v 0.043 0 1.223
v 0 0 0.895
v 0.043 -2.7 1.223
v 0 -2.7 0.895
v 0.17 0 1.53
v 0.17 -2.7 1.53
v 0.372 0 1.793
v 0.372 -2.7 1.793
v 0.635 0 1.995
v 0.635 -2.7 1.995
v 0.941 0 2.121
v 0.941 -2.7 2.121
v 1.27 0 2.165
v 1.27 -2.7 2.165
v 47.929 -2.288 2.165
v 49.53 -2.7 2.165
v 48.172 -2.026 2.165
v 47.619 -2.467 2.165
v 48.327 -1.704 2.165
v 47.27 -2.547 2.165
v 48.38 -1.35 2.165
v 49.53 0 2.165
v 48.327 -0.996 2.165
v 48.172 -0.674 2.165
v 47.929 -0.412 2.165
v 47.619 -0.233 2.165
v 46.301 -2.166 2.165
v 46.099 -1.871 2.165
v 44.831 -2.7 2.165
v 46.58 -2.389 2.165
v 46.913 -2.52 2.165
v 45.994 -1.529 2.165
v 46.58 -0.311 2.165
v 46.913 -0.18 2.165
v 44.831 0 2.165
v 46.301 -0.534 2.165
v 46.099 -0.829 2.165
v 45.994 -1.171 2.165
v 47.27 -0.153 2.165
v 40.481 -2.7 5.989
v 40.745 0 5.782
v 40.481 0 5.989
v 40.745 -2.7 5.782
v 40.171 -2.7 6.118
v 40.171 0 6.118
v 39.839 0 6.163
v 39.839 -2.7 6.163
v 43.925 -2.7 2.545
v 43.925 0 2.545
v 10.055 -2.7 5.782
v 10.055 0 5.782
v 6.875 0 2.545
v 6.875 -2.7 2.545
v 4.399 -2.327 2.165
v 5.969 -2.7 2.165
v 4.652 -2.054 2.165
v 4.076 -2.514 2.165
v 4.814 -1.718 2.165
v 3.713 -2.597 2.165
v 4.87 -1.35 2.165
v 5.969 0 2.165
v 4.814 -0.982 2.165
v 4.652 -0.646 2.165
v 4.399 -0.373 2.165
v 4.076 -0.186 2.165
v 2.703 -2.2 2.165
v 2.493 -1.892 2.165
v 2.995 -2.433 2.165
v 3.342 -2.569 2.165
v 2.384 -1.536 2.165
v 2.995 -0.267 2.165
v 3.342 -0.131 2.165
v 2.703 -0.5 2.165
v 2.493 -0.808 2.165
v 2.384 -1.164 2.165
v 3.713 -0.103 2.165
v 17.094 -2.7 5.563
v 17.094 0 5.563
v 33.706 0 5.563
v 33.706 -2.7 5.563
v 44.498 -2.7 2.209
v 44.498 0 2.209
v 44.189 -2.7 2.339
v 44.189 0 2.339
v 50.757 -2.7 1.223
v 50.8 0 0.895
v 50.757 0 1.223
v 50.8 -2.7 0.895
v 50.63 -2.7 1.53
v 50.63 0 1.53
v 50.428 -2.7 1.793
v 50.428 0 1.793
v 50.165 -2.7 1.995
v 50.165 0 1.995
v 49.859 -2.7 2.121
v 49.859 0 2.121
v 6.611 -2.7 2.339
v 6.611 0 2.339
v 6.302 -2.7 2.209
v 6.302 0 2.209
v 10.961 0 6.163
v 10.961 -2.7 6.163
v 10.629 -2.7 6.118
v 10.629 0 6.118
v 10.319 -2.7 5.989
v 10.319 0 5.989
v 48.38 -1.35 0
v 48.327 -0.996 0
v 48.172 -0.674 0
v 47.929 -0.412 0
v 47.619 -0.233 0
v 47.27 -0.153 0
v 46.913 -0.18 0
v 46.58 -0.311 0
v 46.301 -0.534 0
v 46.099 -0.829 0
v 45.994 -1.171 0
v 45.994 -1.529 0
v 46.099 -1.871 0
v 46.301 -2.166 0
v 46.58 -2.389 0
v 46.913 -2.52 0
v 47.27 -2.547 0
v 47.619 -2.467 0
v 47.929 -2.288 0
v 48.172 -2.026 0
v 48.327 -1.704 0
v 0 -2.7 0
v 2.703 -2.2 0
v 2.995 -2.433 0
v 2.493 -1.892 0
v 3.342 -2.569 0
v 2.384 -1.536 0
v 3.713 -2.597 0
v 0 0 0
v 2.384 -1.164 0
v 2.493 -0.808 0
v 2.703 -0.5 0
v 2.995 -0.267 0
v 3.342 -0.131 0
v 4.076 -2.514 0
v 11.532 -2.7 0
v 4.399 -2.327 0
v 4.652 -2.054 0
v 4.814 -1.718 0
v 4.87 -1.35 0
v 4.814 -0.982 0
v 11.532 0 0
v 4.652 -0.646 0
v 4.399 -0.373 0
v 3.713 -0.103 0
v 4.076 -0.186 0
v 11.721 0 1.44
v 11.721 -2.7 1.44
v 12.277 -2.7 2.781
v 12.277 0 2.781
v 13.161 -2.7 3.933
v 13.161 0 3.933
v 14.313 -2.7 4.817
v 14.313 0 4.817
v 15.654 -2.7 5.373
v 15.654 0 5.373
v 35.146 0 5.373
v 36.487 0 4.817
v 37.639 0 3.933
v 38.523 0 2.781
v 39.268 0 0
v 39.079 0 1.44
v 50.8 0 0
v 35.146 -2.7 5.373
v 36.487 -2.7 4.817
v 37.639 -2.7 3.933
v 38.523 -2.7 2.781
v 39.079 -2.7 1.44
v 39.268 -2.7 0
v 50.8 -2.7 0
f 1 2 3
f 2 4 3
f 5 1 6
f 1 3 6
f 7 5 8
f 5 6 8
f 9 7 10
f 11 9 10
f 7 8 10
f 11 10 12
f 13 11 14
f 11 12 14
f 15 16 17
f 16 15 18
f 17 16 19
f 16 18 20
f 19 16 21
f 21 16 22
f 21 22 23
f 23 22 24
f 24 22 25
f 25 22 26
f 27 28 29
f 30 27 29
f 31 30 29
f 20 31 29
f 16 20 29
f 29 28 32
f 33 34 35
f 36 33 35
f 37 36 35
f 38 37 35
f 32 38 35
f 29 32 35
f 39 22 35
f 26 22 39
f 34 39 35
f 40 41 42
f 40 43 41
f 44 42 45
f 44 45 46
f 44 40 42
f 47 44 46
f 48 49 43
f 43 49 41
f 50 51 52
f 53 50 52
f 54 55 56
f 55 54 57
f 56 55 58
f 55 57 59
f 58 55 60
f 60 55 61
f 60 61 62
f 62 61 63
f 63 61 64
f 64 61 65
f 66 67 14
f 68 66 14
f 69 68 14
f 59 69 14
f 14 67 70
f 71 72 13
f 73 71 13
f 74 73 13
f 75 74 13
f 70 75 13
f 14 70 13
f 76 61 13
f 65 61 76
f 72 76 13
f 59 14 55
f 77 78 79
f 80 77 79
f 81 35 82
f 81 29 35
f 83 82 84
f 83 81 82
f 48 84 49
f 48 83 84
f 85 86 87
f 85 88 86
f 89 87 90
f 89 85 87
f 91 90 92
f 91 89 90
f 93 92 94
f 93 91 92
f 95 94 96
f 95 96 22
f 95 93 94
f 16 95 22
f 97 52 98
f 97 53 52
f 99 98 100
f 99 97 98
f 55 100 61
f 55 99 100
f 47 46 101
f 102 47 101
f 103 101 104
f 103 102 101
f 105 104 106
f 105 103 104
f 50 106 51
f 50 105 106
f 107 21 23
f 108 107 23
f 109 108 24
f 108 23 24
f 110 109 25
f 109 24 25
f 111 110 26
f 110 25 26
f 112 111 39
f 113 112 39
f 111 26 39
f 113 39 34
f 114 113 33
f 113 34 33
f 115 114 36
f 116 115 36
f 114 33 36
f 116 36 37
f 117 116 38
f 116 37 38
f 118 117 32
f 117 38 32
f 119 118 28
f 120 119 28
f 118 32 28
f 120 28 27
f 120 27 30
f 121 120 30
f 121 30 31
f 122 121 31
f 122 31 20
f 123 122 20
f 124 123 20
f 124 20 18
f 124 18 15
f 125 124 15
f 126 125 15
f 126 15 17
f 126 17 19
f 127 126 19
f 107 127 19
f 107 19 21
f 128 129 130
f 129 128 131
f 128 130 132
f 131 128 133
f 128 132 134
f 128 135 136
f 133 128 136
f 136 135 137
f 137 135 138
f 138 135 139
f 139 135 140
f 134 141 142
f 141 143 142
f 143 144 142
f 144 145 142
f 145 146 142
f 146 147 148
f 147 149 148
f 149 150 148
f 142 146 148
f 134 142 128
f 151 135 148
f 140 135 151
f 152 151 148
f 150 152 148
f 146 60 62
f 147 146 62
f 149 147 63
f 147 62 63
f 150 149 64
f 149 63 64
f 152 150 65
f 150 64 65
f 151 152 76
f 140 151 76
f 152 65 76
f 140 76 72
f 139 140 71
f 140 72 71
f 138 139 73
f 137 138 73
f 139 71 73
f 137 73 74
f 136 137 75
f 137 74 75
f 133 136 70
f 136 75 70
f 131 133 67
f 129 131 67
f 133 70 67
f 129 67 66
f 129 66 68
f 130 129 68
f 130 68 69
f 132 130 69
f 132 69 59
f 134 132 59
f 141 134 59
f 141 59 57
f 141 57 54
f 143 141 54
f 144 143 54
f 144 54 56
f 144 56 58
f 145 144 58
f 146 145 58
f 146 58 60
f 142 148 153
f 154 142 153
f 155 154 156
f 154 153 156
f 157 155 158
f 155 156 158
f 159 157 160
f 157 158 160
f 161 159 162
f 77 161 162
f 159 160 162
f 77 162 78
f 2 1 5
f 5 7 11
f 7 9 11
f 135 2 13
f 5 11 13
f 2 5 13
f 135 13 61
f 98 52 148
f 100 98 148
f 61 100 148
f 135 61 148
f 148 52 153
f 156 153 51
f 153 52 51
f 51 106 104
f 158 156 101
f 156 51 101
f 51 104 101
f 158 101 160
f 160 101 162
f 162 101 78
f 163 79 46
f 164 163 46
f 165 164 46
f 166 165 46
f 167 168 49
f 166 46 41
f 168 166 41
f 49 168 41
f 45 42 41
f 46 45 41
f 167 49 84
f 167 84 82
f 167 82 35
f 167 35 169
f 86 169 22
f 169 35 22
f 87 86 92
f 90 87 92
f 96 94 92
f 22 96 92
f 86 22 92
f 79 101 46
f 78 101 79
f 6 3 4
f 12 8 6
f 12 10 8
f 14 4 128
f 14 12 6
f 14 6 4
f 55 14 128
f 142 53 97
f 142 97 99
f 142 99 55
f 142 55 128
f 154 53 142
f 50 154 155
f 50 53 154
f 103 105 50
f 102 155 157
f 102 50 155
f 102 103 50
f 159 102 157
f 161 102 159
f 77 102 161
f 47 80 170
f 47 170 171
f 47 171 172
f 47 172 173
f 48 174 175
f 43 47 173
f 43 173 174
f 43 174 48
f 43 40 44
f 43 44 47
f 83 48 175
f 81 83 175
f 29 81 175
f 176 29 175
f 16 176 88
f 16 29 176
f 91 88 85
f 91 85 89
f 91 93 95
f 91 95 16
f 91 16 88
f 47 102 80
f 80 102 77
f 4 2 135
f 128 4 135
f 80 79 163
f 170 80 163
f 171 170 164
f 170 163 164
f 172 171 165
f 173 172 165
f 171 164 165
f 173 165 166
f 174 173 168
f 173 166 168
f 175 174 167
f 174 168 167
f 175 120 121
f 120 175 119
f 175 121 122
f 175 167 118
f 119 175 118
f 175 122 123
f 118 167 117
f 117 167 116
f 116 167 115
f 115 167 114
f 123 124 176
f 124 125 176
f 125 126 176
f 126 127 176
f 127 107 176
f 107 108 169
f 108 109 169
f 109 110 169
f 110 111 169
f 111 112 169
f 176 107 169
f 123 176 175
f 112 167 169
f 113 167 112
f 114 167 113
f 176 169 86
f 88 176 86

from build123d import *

# Parameters (mm, degrees)
F1_DEPTH = 2.7
F2_R     = 1.27
F3_R     = 1.25
F5_DEPTH = 2.165684
F4_R     = 1.2
F6_DEPTH = 2.165684


with BuildPart() as f1:
    # F0 (on Front) → F1 (new body)
    with BuildSketch(Plane.XZ):
        with BuildLine():
            Line((0, 2.164684), (0, 0))
            Line((0, 0), (11.5316, 0))
            ThreePointArc((11.5316, 0), (13.160848, 3.933352), (17.0942, 5.5626))
            Line((17.0942, 5.5626), (33.7058, 5.5626))
            ThreePointArc((33.7058, 5.5626), (37.639152, 3.933352), (39.2684, 0))
            Line((39.2684, 0), (50.8, 0))
            Line((50.8, 0), (50.8, 2.164684))
            Line((50.8, 2.164684), (44.297848, 2.164684))
            Line((44.297848, 2.164684), (40.37185, 6.1626))
            Line((40.37185, 6.1626), (10.42815, 6.1626))
            Line((10.42815, 6.1626), (6.502152, 2.164684))
            Line((6.502152, 2.164684), (0, 2.164684))
        make_face()
    extrude(amount=F1_DEPTH)

    # F2
    f2_edges = [f1.edges().sort_by_distance(p)[0] for p in [
        (50.8, -1.35, 2.164684),
        (44.297848, -1.35, 2.164684),
        (40.37185, -1.35, 6.1626),
        (10.42815, -1.35, 6.1626),
        (6.502152, -1.35, 2.164684),
        (0, -1.35, 2.164684),
    ]]
    fillet(f2_edges, radius=F2_R)

    # F3 (on face) → F5 (cut, through all)
    with BuildSketch(Plane.XY.offset(2.164684)):
        with Locations((3.619668, -1.35)):
            Circle(F3_R)
    extrude(amount=-F5_DEPTH, mode=Mode.SUBTRACT)

    # F4 (on face) → F6 (cut, through all)
    with BuildSketch(Plane.XY.offset(2.164684)):
        with Locations((47.180332, -1.35)):
            Circle(F4_R)
    extrude(amount=-F6_DEPTH, mode=Mode.SUBTRACT)


solid = f1.part
